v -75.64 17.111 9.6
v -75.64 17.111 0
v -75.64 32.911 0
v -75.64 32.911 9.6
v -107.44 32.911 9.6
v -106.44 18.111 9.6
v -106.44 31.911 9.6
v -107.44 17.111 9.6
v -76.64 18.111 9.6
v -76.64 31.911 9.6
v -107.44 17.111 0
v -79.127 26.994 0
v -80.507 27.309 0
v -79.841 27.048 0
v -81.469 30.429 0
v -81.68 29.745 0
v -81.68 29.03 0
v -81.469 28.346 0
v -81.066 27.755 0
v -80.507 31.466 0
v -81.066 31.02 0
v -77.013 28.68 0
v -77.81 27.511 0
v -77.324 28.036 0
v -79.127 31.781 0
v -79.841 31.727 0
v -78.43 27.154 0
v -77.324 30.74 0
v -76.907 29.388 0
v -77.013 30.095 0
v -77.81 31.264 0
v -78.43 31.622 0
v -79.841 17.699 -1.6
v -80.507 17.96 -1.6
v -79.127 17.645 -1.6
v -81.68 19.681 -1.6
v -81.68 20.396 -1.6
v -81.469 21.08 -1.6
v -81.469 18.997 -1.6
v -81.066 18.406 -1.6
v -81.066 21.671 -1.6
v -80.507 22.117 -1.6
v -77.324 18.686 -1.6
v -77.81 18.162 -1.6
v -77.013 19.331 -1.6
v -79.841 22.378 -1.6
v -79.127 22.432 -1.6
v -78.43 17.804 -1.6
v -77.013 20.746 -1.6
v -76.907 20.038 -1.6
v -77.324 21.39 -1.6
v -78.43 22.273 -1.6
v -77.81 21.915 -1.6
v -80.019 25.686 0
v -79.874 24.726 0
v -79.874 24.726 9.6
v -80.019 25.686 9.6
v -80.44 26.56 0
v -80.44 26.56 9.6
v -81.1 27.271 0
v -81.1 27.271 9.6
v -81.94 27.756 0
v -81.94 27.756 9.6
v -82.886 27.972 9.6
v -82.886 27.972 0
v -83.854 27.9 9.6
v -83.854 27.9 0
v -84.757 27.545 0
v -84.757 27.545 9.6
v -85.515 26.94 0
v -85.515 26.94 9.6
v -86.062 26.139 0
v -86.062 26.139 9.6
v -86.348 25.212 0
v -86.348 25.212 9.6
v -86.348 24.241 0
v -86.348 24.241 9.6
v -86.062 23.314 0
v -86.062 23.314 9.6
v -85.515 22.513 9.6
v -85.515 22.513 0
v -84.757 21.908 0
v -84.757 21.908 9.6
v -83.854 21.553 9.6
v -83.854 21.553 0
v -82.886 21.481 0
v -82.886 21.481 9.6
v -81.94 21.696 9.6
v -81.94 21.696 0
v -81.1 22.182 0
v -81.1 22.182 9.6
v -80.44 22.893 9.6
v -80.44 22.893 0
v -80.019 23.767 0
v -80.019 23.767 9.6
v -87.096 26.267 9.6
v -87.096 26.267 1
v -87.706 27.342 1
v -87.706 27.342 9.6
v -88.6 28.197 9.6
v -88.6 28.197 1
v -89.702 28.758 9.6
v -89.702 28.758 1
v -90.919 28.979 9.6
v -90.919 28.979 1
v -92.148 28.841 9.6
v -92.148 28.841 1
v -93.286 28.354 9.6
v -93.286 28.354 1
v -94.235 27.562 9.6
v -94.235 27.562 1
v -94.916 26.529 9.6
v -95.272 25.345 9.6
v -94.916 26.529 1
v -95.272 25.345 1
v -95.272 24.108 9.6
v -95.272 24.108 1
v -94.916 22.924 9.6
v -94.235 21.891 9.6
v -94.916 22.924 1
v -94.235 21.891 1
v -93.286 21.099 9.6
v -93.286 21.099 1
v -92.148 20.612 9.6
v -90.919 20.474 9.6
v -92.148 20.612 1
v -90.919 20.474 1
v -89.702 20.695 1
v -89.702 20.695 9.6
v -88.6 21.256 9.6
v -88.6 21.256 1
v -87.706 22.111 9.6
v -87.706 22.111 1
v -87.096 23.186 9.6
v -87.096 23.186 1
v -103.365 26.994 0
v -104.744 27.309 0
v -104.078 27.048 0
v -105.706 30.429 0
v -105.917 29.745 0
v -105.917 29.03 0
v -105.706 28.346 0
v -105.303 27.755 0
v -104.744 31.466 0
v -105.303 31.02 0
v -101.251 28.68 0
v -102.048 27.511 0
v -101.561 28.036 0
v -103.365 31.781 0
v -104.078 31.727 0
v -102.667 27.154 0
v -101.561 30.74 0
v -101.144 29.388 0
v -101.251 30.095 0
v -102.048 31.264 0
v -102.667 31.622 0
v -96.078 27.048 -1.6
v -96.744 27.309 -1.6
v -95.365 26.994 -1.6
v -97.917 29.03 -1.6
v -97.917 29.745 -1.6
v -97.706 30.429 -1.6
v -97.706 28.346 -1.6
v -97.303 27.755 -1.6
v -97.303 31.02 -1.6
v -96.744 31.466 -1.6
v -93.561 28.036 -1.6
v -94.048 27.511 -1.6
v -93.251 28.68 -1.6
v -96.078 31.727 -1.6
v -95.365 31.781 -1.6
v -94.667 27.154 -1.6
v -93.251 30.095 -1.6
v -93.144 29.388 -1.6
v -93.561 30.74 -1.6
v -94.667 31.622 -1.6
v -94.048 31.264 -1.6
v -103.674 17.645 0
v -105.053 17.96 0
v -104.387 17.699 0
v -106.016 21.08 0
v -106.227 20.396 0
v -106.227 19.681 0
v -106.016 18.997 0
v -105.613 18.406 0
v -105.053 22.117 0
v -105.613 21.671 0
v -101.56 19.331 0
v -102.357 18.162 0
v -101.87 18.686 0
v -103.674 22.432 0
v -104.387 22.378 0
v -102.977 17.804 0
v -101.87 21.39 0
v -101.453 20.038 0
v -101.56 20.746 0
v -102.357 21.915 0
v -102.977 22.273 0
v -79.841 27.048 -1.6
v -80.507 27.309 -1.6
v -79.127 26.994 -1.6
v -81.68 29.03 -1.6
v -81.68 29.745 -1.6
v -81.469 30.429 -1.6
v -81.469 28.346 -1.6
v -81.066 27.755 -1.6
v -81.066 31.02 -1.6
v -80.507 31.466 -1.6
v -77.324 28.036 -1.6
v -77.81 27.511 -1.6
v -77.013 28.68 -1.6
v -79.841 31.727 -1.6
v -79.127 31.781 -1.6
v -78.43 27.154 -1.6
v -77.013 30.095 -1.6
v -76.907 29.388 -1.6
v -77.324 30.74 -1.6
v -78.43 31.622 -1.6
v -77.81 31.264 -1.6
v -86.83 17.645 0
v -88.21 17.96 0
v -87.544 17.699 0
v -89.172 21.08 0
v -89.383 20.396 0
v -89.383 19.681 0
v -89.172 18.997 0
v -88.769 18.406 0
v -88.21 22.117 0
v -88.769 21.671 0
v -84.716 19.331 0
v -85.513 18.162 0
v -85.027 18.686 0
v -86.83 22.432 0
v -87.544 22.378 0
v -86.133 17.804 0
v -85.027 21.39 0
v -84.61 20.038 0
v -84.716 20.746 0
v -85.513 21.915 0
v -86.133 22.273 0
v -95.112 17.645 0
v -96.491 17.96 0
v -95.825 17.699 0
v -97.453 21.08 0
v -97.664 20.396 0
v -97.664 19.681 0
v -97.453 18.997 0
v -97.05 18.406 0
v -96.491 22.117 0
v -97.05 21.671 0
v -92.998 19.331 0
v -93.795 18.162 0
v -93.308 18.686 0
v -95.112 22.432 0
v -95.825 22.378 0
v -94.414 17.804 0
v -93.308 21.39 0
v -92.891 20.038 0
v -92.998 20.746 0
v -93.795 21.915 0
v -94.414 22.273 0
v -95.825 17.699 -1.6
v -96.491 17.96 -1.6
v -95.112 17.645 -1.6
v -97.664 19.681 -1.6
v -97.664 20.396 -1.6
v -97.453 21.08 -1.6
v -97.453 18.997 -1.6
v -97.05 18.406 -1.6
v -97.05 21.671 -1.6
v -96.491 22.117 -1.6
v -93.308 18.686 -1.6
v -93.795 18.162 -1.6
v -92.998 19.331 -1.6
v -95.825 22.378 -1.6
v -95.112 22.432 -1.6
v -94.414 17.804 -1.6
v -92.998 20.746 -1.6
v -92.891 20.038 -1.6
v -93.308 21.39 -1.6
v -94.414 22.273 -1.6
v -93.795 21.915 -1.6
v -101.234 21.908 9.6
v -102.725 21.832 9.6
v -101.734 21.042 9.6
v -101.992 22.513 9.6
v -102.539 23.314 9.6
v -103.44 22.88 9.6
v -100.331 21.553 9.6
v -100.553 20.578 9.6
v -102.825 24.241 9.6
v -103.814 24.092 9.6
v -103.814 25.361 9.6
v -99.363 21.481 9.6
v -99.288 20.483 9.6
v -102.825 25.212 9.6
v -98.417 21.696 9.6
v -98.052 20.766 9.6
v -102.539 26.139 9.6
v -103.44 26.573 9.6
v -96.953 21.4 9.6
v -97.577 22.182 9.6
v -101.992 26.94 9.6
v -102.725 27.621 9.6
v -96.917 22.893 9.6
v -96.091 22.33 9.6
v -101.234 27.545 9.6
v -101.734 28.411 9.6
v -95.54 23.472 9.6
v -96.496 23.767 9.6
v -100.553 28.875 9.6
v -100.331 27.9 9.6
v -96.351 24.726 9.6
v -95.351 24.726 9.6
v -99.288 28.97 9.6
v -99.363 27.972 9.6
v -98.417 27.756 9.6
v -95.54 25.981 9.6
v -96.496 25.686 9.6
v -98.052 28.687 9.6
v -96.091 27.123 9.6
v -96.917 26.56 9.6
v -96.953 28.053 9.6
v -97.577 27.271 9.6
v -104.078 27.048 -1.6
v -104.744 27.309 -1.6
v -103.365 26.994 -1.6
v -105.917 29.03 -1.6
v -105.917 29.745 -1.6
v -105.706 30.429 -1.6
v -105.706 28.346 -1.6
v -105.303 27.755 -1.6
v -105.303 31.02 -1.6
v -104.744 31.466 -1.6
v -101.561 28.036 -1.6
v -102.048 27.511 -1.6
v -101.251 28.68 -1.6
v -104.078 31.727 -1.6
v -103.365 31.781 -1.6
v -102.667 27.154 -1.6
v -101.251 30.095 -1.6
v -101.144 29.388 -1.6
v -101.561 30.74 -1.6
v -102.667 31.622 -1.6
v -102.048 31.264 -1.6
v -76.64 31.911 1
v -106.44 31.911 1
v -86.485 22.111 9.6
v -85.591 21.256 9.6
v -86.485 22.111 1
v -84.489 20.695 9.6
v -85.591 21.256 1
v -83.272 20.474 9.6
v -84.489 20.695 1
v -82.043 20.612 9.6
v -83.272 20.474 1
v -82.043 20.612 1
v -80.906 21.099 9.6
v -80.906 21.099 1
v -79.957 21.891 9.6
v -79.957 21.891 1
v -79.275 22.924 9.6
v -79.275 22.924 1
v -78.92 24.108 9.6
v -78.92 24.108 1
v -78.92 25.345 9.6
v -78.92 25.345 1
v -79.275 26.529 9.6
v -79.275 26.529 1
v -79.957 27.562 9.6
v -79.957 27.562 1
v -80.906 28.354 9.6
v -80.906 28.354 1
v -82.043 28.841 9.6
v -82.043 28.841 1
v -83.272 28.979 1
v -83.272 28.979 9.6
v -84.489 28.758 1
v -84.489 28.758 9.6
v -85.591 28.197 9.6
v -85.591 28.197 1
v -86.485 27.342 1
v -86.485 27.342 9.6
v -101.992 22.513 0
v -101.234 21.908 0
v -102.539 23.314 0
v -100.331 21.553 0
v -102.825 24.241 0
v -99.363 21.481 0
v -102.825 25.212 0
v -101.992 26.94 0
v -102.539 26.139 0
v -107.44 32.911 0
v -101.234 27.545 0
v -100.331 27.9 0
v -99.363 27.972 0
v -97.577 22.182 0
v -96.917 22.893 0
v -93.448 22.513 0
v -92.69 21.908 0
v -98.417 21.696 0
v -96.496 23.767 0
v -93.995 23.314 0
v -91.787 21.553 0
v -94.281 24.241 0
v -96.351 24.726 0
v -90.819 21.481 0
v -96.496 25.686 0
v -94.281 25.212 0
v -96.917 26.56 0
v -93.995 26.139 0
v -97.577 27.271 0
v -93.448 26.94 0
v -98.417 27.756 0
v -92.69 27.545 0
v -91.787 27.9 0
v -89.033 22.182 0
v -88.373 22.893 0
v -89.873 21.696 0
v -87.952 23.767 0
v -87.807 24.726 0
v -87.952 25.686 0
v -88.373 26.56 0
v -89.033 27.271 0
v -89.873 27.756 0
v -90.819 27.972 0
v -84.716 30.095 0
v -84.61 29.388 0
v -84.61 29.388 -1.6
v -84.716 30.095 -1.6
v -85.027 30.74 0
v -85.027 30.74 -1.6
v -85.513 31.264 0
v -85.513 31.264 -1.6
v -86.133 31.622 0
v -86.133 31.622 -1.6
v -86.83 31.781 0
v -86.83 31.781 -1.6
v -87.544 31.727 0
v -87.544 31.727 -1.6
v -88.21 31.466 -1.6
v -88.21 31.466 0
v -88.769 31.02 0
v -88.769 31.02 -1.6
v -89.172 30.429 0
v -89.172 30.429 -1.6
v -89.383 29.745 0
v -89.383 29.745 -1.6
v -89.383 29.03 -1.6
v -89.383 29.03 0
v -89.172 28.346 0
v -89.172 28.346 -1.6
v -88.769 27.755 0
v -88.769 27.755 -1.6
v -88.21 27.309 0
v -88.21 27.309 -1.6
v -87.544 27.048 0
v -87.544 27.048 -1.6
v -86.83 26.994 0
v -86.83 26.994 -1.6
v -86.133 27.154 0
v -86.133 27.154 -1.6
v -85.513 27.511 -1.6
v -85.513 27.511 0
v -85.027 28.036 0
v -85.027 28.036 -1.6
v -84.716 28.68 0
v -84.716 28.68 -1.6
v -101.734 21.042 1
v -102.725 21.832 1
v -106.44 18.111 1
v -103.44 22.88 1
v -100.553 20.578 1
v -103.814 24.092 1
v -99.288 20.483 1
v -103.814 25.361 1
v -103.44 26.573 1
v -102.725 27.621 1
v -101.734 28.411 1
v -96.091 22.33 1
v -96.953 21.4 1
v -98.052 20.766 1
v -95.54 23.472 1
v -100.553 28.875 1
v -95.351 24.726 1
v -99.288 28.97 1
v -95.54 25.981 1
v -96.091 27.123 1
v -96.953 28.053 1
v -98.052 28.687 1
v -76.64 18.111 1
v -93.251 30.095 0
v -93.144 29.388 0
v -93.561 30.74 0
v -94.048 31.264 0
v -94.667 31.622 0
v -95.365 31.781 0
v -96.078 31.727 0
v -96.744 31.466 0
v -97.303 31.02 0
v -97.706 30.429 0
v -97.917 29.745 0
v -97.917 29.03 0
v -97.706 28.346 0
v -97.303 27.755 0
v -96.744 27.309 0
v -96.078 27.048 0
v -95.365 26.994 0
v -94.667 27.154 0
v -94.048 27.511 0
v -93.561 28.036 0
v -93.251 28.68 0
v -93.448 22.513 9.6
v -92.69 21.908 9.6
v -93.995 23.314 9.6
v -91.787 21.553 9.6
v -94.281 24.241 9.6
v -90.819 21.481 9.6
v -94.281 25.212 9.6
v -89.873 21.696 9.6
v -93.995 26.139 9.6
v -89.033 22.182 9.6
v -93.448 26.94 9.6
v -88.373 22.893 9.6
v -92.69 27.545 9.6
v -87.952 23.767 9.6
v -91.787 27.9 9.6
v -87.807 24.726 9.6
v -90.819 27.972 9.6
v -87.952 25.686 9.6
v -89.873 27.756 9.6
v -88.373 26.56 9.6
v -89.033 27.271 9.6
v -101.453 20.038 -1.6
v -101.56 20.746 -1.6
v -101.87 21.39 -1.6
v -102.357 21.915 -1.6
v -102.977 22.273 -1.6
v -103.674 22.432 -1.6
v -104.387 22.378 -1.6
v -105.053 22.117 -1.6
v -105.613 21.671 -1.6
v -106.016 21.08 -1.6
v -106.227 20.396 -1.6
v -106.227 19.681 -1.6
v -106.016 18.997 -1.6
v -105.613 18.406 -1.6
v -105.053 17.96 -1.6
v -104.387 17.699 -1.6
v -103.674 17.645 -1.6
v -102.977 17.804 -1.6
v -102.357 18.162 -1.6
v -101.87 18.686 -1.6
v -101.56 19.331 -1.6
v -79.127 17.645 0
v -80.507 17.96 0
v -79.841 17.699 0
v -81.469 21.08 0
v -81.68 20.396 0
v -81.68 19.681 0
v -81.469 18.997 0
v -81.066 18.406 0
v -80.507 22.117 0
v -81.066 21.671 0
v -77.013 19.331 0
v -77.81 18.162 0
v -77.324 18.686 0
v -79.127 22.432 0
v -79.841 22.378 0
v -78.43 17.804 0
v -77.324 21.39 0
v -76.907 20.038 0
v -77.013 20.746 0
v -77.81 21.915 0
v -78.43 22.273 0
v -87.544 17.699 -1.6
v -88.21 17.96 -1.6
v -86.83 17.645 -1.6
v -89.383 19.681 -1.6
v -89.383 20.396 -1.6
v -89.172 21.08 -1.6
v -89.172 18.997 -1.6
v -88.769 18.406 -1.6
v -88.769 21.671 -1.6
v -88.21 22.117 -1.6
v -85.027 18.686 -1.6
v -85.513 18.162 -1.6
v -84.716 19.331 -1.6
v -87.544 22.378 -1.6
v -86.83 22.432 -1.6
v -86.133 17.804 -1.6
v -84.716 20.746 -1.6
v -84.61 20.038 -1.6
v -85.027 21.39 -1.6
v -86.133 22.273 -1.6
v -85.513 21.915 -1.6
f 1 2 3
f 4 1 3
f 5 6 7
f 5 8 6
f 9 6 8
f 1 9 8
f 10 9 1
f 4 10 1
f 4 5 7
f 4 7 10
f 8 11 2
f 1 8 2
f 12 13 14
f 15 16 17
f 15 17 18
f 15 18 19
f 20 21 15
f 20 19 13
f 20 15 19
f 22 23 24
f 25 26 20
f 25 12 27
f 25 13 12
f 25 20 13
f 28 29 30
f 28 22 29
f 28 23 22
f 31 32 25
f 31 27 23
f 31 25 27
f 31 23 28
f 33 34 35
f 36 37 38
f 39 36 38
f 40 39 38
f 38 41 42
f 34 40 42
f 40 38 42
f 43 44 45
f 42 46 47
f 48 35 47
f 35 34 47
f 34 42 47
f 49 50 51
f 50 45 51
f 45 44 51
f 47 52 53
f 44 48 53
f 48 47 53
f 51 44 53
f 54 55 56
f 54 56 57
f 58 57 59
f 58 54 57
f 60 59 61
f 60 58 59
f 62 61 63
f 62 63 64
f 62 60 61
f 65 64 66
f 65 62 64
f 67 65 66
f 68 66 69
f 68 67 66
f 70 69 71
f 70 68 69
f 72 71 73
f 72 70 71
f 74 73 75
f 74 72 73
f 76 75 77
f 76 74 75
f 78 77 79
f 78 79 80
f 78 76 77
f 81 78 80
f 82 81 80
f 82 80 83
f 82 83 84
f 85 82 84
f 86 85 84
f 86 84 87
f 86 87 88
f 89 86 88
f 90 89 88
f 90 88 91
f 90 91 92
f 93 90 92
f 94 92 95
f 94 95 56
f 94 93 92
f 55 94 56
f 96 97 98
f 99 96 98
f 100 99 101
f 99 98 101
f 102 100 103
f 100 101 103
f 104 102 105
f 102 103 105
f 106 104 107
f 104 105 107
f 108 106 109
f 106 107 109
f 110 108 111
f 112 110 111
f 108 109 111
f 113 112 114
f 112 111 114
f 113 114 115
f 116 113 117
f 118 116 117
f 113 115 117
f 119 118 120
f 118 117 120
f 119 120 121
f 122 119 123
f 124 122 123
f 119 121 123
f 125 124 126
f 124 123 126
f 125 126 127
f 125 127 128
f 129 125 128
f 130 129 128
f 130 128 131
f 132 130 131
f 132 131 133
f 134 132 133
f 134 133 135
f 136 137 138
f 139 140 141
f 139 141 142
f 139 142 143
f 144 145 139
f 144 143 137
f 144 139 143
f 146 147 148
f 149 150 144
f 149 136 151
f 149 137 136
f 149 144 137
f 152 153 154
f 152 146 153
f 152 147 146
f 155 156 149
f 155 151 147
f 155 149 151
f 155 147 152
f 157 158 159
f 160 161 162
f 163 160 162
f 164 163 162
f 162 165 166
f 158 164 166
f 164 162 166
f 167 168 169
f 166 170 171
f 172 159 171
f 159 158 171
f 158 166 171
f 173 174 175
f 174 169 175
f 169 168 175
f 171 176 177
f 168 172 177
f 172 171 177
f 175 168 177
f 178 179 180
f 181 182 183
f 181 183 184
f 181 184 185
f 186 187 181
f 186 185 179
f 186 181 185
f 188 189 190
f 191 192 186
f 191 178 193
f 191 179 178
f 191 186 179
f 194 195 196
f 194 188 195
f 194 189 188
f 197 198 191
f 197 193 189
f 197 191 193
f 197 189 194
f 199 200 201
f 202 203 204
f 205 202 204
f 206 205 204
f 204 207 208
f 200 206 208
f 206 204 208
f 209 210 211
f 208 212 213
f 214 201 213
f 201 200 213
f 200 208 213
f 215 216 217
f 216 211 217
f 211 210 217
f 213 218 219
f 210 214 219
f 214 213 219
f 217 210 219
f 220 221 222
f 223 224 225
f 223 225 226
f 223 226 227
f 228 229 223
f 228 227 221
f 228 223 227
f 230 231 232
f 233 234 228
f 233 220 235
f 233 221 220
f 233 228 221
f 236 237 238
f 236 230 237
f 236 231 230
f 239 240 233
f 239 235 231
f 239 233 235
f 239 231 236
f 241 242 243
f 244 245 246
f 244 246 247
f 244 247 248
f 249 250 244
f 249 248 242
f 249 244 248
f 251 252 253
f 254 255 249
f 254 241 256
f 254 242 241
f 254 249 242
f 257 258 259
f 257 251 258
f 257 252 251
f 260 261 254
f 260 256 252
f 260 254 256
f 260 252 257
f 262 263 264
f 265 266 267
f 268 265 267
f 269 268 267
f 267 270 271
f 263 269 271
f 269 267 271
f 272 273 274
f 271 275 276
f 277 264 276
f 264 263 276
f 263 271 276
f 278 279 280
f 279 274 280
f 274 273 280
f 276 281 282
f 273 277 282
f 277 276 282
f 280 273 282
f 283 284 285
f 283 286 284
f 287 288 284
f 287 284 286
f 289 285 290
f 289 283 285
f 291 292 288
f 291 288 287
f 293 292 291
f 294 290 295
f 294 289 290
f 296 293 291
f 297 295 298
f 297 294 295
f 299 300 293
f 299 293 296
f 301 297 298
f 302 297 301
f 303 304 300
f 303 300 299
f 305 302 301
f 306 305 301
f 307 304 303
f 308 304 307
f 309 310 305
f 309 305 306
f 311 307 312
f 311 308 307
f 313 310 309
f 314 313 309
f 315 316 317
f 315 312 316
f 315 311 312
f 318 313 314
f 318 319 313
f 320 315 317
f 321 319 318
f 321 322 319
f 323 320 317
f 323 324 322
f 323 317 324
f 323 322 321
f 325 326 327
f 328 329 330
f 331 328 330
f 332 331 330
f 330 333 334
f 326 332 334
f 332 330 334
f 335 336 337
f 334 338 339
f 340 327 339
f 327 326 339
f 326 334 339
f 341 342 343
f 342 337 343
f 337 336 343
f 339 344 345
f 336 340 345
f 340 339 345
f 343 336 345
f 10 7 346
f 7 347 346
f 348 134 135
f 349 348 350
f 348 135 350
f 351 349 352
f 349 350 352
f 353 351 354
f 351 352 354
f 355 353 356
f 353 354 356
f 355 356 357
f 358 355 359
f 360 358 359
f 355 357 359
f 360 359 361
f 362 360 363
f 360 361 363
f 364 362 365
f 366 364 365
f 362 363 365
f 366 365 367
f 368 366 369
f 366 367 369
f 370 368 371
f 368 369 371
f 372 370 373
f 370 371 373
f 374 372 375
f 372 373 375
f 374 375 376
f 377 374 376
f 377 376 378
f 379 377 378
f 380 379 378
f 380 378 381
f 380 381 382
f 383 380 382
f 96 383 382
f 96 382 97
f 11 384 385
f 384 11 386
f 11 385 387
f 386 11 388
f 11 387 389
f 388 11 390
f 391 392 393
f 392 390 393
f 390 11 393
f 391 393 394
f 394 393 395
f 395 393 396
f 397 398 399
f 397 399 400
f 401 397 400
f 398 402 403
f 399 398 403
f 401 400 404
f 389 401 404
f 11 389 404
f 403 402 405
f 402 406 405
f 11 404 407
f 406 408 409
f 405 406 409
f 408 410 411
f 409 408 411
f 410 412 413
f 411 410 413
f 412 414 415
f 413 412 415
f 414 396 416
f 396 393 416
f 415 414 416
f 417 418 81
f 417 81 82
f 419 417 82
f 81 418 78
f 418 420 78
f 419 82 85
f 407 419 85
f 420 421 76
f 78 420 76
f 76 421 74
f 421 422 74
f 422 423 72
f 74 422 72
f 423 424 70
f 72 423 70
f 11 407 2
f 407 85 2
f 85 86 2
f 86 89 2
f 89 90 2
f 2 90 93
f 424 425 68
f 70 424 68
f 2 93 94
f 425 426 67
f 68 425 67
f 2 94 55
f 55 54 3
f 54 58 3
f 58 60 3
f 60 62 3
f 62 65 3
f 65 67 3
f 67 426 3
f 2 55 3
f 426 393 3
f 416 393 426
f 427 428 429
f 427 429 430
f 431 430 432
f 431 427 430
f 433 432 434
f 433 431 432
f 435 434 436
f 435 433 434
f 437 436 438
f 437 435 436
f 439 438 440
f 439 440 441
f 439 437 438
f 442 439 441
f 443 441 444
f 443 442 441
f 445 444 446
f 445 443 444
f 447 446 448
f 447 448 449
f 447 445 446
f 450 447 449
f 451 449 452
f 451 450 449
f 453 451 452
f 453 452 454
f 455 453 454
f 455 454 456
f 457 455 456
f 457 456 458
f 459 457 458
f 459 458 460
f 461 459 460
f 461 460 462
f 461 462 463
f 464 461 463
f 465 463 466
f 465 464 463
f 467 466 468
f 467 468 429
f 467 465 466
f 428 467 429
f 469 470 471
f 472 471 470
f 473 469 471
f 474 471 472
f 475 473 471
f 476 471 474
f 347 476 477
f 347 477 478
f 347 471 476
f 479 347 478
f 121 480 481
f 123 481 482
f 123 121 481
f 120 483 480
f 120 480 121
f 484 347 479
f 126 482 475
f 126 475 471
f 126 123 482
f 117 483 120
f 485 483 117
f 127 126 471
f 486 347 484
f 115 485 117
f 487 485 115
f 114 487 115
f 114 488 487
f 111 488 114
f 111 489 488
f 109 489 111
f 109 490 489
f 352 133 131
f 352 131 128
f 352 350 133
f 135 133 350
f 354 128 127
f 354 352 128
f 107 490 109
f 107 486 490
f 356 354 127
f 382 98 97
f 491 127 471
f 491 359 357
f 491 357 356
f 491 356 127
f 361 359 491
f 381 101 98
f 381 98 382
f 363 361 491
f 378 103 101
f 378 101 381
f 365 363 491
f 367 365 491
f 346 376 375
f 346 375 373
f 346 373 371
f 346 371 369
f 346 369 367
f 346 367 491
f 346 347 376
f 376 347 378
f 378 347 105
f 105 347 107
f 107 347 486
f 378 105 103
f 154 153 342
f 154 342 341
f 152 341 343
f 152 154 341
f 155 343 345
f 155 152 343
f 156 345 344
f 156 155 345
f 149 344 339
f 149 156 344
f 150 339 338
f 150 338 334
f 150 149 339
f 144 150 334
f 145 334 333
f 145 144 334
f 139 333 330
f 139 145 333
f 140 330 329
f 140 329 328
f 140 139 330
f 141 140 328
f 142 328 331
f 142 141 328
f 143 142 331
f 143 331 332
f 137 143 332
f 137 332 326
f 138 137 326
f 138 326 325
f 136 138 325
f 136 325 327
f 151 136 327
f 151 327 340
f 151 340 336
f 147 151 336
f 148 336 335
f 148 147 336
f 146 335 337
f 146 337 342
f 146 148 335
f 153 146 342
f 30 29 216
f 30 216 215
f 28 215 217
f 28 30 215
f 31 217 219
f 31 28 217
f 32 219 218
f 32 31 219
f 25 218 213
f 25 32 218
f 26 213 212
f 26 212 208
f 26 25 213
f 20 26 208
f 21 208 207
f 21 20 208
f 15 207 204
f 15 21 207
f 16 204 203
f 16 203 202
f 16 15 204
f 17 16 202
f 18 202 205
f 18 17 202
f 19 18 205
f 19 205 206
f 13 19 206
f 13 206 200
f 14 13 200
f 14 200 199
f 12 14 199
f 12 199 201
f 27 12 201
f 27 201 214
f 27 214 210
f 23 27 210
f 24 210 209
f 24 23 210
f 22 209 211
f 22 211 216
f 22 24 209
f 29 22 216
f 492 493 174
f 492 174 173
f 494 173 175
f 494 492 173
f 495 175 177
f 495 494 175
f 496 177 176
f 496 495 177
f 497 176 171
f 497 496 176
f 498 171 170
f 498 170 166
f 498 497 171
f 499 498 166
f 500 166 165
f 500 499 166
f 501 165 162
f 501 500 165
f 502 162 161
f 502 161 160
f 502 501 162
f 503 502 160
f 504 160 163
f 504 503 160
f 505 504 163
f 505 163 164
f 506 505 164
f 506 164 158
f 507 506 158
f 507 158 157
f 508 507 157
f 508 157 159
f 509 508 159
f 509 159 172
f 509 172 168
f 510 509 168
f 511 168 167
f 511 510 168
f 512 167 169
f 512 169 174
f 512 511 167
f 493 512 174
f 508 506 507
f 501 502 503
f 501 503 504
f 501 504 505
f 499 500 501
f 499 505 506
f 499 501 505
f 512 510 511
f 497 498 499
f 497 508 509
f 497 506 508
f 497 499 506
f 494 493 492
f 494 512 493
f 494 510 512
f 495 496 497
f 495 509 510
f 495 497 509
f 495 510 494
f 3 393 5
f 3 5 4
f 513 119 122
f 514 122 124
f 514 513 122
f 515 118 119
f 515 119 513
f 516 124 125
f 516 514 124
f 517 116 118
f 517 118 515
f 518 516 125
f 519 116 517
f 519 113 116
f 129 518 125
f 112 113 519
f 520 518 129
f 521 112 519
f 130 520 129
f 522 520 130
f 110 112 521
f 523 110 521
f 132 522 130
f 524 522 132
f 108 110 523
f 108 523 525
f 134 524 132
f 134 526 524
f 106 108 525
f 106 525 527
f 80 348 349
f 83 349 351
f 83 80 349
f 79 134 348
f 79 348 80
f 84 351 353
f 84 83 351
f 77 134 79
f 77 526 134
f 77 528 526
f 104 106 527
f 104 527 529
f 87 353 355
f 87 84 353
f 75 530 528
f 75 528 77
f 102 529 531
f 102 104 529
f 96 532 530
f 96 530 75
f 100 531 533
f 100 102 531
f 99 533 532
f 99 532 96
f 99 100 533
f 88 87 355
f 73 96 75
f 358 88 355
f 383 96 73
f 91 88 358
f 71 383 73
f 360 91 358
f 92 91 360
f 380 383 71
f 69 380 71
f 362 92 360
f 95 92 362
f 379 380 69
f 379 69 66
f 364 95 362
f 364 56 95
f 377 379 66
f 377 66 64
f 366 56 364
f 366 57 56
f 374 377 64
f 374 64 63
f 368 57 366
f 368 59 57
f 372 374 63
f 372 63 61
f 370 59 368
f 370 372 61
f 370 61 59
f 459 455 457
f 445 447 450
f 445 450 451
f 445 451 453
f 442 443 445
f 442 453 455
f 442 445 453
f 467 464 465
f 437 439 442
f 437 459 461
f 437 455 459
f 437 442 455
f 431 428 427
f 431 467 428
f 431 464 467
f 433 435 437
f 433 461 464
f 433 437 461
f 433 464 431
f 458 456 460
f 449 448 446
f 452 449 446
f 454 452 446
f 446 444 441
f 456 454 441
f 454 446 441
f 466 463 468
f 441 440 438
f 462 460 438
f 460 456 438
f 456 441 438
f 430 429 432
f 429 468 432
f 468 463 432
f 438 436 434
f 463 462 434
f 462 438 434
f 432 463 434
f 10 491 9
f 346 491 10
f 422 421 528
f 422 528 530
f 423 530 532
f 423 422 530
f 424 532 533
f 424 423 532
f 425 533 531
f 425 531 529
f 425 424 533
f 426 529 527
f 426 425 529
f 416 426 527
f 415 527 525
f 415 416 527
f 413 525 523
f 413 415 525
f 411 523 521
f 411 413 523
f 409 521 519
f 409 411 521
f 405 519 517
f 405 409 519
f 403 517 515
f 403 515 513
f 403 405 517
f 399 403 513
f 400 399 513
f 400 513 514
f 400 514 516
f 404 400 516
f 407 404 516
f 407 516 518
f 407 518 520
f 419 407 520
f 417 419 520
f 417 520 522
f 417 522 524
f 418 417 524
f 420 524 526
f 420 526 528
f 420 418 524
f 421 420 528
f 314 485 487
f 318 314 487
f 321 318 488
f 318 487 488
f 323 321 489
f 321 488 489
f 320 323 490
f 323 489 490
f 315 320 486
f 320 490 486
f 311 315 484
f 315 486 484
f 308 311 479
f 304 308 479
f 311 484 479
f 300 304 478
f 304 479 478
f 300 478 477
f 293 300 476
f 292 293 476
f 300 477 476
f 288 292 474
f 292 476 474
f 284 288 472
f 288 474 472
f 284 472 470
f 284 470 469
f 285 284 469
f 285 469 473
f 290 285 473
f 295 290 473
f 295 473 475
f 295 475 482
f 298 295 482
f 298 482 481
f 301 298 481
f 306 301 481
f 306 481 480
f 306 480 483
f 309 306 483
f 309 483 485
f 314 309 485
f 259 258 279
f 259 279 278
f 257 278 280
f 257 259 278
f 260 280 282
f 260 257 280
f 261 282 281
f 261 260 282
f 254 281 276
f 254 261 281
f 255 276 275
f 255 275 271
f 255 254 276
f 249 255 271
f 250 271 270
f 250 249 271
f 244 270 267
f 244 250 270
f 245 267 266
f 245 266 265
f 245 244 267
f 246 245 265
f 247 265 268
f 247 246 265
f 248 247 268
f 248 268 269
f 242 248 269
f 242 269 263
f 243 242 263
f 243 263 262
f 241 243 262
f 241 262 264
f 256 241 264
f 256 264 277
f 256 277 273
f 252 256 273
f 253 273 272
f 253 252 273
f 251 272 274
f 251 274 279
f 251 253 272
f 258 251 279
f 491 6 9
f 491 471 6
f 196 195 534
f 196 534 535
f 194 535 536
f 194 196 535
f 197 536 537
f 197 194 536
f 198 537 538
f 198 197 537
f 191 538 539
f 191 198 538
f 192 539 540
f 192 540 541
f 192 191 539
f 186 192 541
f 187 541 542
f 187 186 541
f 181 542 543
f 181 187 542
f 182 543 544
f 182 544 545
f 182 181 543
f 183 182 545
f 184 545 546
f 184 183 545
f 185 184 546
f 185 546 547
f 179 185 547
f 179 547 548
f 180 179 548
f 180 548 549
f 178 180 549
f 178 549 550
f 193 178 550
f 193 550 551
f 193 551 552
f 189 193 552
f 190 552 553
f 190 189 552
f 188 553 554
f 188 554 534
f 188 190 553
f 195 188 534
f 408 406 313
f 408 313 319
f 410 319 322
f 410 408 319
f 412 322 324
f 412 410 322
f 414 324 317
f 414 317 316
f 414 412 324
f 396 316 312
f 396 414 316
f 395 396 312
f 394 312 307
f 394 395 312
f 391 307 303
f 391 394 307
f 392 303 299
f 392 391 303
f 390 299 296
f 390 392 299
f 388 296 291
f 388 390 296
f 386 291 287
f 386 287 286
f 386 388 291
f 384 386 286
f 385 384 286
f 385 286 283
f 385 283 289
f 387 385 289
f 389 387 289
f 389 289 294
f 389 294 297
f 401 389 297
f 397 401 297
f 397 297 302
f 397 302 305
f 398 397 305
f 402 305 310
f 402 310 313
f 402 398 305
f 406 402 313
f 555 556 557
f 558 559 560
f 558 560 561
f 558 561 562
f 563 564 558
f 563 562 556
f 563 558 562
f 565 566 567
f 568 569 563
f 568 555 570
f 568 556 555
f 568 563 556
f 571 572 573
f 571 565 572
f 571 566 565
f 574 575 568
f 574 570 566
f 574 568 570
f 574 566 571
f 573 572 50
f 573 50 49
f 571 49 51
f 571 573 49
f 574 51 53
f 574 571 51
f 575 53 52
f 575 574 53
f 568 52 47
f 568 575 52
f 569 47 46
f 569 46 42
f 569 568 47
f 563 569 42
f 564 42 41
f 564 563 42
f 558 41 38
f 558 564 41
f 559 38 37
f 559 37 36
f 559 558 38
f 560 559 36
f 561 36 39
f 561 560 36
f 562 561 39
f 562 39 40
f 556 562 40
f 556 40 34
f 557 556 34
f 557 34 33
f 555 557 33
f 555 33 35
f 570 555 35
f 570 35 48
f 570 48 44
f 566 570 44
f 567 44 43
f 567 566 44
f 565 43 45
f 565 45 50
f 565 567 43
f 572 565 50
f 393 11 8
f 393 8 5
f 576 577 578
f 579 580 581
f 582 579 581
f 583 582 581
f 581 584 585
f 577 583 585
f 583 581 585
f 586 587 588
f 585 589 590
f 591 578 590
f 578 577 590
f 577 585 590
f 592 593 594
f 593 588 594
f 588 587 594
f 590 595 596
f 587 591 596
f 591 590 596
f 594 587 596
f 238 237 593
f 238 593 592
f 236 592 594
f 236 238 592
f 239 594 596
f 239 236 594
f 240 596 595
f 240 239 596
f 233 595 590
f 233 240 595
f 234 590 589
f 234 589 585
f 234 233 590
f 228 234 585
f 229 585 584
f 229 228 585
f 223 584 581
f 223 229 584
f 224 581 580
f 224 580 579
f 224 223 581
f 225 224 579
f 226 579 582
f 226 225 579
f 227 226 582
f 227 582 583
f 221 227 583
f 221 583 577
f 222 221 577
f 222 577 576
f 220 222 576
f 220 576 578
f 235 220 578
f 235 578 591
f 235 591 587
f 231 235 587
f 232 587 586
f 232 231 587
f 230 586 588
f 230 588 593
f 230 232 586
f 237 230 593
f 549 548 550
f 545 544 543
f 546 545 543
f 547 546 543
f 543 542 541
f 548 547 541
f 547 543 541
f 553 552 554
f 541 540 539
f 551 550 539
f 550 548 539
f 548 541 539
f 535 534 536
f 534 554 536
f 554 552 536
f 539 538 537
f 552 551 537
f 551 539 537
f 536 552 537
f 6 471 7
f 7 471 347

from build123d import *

# Parameters (mm, degrees)
F0_W     = 31.8
F0_H     = 15.8
F0_R     = 2.4
F0_R_2   = 3.255
F1_DEPTH = 9.6
F2_DEPTH = 1.6
F3_T     = -1


# Not quite as in the source:
# - a feature names something its author has since deleted; it is built from what else it names


with BuildPart() as f1:
    # F0 (on Top) → F1 (new body)
    with BuildSketch(Plane.XY):
        with Locations((-91.5395749569, 25.0114094891)):
            Rectangle(F0_W, F0_H)
        with Locations((-103.8533747765, 20.0384181401)):
            Circle(F0_R, mode=Mode.SUBTRACT)
        with Locations((-95.2911525131, 20.0384181401)):
            Circle(F0_R, mode=Mode.SUBTRACT)
        with Locations((-99.6062383056, 24.726472795)):
            Circle(F0_R_2, mode=Mode.SUBTRACT)
        with Locations((-87.0096325433, 20.0384181401)):
            Circle(F0_R, mode=Mode.SUBTRACT)
        with Locations((-79.3065652251, 20.0384181401)):
            Circle(F0_R, mode=Mode.SUBTRACT)
        with Locations((-91.0623019177, 24.726472795)):
            Circle(F0_R_2, mode=Mode.SUBTRACT)
        with Locations((-83.1293836236, 24.726472795)):
            Circle(F0_R_2, mode=Mode.SUBTRACT)
        with Locations((-103.5441160202, 29.3876323849)):
            Circle(F0_R, mode=Mode.SUBTRACT)
        with Locations((-95.5441160202, 29.3876323849)):
            Circle(F0_R, mode=Mode.SUBTRACT)
        with Locations((-87.0096325433, 29.3876323849)):
            Circle(F0_R, mode=Mode.SUBTRACT)
        with Locations((-79.3065652251, 29.3876323849)):
            Circle(F0_R, mode=Mode.SUBTRACT)
        with Locations((-103.5441160202, 29.3876323849)):
            Circle(F0_R)
        with Locations((-79.3065652251, 29.3876323849)):
            Circle(F0_R)
        with Locations((-87.0096325433, 29.3876323849)):
            Circle(F0_R)
        with Locations((-79.3065652251, 20.0384181401)):
            Circle(F0_R)
        with Locations((-103.8533747765, 20.0384181401)):
            Circle(F0_R)
        with Locations((-95.5441160202, 29.3876323849)):
            Circle(F0_R)
        with Locations((-95.2911525131, 20.0384181401)):
            Circle(F0_R)
        with Locations((-87.0096325433, 20.0384181401)):
            Circle(F0_R)
    extrude(amount=F1_DEPTH)

    # F3
    f3_openings = [f1.faces().sort_by_distance(p)[0] for p in [
        (-91.539575, 32.556321, 9.6),
    ]]
    offset(amount=F3_T, openings=f3_openings)


with BuildPart() as f2:
    # F0 (on Top) → F2 (new body)
    with BuildSketch(Plane.XY):
        with Locations((-103.5441160202, 29.3876323849)):
            Circle(F0_R)
    extrude(amount=-F2_DEPTH)


with BuildPart() as f2b:
    # F0 (on Top) → F2, piece 2 (new body)
    with BuildSketch(Plane.XY):
        with Locations((-87.0096325433, 29.3876323849)):
            Circle(F0_R)
    extrude(amount=-F2_DEPTH)


with BuildPart() as f2c:
    # F0 (on Top) → F2, piece 3 (new body)
    with BuildSketch(Plane.XY):
        with Locations((-95.5441160202, 29.3876323849)):
            Circle(F0_R)
    extrude(amount=-F2_DEPTH)


with BuildPart() as f2d:
    # F0 (on Top) → F2, piece 4 (new body)
    with BuildSketch(Plane.XY):
        with Locations((-79.3065652251, 29.3876323849)):
            Circle(F0_R)
    extrude(amount=-F2_DEPTH)


with BuildPart() as f2e:
    # F0 (on Top) → F2, piece 5 (new body)
    with BuildSketch(Plane.XY):
        with Locations((-87.0096325433, 20.0384181401)):
            Circle(F0_R)
    extrude(amount=-F2_DEPTH)


with BuildPart() as f2f:
    # F0 (on Top) → F2, piece 6 (new body)
    with BuildSketch(Plane.XY):
        with Locations((-79.3065652251, 20.0384181401)):
            Circle(F0_R)
    extrude(amount=-F2_DEPTH)


with BuildPart() as f2g:
    # F0 (on Top) → F2, piece 7 (new body)
    with BuildSketch(Plane.XY):
        with Locations((-95.2911525131, 20.0384181401)):
            Circle(F0_R)
    extrude(amount=-F2_DEPTH)


with BuildPart() as f2h:
    # F0 (on Top) → F2, piece 8 (new body)
    with BuildSketch(Plane.XY):
        with Locations((-103.8533747765, 20.0384181401)):
            Circle(F0_R)
    extrude(amount=-F2_DEPTH)


solid = Compound([f1.part, f2.part, f2b.part, f2c.part, f2d.part, f2e.part, f2f.part, f2g.part, f2h.part])
